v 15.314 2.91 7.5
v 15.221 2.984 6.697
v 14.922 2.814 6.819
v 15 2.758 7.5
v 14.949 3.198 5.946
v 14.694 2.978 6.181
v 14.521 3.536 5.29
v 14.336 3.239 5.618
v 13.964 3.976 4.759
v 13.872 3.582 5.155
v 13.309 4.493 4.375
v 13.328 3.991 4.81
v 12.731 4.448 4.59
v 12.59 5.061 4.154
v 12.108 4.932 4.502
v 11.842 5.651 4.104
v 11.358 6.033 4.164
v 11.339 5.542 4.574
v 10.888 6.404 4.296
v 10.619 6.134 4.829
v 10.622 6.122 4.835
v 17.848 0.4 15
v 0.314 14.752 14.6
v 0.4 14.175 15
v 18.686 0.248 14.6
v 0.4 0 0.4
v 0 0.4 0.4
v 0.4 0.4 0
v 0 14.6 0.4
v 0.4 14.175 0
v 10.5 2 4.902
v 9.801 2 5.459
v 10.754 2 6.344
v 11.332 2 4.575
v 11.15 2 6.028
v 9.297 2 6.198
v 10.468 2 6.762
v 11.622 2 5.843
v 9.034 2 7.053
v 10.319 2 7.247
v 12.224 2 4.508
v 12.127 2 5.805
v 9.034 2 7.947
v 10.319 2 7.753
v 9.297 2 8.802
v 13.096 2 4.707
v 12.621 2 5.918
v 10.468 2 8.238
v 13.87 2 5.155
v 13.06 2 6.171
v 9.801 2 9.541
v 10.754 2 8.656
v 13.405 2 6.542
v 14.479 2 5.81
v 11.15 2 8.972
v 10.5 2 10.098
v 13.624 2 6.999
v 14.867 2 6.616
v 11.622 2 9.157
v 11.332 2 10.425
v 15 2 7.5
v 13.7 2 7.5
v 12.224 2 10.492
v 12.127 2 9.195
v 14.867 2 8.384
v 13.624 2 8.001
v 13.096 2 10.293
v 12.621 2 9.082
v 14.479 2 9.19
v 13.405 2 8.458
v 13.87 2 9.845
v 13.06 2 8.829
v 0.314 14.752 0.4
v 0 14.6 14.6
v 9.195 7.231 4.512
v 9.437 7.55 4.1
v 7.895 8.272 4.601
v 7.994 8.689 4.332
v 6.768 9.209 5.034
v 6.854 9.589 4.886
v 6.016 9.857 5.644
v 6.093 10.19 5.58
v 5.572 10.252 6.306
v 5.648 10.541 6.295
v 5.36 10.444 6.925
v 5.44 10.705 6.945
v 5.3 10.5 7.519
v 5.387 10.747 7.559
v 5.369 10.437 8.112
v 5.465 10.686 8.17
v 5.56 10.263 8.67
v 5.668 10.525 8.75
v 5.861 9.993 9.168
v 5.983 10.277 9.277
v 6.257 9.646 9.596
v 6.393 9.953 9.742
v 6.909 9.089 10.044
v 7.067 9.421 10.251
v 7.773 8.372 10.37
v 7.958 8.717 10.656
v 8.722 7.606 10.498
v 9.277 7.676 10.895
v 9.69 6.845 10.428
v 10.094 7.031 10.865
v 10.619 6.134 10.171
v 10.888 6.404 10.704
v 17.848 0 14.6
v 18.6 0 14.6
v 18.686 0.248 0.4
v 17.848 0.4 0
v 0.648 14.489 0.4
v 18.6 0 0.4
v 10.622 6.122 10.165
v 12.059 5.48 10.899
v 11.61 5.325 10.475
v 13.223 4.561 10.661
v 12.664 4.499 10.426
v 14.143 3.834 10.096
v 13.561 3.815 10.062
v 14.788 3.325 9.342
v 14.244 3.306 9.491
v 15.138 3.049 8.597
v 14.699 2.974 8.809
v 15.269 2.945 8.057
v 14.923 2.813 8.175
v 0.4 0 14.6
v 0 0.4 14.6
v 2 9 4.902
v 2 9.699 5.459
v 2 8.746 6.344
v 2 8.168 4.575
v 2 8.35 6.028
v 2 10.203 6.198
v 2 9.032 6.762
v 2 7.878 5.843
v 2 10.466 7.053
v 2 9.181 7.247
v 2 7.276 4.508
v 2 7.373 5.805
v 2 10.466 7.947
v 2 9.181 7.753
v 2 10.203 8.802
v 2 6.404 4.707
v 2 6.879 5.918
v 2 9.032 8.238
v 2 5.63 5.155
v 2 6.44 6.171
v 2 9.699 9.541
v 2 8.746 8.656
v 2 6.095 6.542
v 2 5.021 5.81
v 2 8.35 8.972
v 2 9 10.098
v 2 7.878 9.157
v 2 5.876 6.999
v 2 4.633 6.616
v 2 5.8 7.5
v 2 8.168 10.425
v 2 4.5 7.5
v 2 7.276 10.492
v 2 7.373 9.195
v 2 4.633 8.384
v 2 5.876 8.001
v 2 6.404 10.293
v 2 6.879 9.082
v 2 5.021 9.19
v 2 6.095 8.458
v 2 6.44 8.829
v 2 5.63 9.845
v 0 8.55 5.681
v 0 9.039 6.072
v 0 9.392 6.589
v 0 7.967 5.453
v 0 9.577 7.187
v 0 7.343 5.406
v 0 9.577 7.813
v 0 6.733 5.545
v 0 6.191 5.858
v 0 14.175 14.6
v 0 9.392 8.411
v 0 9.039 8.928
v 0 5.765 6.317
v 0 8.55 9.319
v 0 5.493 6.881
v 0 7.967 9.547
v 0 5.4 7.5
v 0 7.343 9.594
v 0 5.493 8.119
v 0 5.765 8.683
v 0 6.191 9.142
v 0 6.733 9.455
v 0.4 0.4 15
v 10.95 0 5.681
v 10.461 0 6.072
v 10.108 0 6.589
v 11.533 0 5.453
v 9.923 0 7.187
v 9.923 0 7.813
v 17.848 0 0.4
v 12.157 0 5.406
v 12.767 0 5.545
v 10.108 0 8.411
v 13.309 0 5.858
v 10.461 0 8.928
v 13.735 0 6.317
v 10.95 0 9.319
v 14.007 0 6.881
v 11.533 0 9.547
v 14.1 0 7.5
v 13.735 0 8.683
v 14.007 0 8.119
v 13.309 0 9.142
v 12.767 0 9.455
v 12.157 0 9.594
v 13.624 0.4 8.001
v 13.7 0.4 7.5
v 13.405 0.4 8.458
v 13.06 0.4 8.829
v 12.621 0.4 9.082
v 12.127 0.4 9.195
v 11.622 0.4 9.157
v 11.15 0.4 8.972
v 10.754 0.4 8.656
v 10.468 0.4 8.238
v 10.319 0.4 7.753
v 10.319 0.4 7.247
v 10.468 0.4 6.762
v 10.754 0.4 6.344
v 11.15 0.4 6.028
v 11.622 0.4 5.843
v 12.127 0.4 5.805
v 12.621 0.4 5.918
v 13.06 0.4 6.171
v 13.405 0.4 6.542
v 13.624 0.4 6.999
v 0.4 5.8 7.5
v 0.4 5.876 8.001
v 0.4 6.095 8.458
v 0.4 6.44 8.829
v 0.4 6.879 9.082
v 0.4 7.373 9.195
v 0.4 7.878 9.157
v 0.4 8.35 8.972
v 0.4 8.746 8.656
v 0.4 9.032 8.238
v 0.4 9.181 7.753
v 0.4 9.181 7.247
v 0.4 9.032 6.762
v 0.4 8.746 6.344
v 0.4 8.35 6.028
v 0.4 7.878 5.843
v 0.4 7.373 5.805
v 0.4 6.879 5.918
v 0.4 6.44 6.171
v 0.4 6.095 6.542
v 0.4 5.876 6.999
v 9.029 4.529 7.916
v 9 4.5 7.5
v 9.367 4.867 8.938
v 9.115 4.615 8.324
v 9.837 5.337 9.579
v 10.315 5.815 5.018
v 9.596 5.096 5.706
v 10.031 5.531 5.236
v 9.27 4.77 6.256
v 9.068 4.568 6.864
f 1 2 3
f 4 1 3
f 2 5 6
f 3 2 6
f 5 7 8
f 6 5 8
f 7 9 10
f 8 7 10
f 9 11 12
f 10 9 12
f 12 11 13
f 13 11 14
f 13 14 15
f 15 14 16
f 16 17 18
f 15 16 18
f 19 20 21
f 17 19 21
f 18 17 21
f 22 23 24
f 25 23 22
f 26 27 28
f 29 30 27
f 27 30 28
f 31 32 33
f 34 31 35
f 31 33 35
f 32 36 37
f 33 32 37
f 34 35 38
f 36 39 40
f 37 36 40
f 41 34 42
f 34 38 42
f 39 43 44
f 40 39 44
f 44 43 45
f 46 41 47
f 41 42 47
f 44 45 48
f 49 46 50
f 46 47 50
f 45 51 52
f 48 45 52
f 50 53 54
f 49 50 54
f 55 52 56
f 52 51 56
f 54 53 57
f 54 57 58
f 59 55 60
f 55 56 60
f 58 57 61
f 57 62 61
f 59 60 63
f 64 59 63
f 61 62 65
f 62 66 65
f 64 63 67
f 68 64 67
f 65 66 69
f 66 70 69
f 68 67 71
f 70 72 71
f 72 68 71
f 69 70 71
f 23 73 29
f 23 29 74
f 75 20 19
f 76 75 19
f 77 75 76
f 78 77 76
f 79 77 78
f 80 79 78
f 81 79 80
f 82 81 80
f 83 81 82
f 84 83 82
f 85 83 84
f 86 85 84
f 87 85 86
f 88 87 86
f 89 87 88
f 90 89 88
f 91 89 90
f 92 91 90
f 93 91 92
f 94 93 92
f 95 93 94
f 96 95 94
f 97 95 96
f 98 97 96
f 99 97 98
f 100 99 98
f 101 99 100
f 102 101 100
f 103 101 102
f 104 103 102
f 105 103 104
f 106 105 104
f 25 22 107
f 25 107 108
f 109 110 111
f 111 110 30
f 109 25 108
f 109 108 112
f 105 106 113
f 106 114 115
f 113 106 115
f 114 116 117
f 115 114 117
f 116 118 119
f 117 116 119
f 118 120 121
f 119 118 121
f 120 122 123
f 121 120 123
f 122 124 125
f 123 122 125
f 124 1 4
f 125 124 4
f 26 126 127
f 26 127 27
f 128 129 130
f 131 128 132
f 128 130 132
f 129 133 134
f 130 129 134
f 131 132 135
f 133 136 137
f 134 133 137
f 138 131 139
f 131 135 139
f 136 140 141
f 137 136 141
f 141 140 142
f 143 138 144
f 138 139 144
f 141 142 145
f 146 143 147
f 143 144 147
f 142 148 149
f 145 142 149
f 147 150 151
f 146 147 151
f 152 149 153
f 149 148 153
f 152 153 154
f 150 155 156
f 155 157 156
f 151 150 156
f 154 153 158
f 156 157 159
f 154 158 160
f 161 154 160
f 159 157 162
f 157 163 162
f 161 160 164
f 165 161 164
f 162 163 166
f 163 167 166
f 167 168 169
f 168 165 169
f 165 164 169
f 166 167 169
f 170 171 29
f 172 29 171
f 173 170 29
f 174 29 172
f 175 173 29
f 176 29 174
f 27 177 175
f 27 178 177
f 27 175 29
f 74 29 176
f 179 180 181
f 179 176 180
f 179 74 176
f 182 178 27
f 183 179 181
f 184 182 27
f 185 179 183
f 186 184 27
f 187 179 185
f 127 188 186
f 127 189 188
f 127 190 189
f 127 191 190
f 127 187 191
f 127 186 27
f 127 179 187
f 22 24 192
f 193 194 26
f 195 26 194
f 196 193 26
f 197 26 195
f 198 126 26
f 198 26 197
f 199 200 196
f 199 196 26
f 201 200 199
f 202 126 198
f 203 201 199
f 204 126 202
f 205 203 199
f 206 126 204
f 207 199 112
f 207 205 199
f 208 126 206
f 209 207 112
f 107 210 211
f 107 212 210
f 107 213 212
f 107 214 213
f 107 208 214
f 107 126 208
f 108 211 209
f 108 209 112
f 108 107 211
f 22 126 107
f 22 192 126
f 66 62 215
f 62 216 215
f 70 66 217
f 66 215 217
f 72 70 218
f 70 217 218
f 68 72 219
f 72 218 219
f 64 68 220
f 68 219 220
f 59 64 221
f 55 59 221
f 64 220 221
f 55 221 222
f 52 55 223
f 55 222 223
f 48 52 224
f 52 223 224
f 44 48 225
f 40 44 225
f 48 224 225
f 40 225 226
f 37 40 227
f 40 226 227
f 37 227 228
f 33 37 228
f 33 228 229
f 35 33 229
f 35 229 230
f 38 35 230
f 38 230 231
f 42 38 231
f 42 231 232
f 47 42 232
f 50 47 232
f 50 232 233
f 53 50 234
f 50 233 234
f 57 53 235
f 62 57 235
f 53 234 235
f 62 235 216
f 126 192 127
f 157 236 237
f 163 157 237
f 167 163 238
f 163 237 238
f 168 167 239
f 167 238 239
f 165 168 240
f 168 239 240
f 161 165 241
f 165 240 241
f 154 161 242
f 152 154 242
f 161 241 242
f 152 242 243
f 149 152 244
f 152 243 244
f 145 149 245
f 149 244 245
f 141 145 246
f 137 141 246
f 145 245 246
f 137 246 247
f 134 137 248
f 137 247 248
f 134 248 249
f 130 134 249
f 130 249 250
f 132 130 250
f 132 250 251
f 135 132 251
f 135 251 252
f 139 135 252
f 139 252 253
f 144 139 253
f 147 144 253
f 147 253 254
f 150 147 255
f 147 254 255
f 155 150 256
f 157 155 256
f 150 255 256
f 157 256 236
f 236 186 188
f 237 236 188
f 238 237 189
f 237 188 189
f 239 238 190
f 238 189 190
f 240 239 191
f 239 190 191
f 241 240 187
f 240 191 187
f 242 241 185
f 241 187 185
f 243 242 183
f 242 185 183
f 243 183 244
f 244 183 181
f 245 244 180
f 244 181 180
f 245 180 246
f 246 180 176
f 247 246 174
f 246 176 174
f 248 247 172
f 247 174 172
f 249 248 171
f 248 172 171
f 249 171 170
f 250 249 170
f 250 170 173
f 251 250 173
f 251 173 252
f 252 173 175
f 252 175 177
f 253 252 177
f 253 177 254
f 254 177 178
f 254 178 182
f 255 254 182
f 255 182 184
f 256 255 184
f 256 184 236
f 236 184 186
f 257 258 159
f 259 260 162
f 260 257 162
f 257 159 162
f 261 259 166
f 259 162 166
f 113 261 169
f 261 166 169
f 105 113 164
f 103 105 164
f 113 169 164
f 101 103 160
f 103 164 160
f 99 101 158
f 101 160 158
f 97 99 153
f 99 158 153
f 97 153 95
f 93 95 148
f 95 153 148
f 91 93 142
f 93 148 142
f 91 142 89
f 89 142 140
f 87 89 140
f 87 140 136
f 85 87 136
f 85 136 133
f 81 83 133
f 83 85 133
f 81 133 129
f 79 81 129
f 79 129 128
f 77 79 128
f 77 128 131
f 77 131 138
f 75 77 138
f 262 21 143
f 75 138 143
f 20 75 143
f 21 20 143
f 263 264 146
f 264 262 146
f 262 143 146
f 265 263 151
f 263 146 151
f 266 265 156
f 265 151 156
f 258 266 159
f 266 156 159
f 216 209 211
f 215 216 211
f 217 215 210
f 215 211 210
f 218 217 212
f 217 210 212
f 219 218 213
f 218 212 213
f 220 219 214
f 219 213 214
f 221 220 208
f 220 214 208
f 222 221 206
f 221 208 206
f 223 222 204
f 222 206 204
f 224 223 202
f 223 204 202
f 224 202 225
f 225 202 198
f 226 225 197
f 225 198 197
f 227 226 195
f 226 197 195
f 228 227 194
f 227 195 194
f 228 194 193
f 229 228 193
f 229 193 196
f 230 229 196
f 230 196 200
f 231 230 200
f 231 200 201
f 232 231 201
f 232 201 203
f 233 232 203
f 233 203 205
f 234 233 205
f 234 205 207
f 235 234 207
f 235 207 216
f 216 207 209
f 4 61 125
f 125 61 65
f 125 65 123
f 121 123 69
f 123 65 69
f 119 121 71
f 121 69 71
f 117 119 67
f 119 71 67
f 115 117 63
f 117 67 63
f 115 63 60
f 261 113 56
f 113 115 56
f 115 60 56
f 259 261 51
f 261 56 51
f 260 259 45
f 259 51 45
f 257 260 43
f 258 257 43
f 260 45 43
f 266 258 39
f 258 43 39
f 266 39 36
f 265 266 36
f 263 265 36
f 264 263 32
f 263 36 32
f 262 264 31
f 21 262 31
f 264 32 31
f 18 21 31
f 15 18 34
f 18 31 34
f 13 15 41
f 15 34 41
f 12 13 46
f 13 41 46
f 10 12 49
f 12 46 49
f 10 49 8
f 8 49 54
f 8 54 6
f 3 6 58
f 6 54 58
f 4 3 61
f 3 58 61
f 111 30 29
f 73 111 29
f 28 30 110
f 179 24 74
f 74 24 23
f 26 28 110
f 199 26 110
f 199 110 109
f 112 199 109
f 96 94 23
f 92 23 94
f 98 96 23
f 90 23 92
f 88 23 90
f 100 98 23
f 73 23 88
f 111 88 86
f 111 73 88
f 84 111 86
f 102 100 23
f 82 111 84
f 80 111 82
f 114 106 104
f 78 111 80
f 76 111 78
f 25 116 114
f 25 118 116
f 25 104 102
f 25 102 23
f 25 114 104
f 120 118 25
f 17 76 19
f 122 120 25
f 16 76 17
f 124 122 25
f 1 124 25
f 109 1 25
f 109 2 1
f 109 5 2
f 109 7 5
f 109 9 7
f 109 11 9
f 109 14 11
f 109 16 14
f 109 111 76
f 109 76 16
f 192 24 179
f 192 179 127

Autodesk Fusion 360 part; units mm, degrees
sketch "Sketch1" plane through (0, 0, 0) normal (0, 0, 1) x (1, 0, 0)
  line L0 (0, 0) -> (19, 0)
  line L1 (0, 0) -> (0, 15)
  line L2 (0, 15) -> (19, 0)
  dimension "d1" = 19
  dimension "d2" = 15
extrude "Extrude1" add sketch "Sketch1" along normal blind 15
sketch "cable_holes" plane through (0, 0, 0) normal (0, -1, 0) x (1, 0, 0)
  line L0 (0, 0) -> (19, 0)
  line L1 (19, 0) -> (19, 15)
  line L2 (19, 15) -> (0, 15)
  line L3 (0, 15) -> (0, 0)
  circle A0 centre (4.2, 10.7) radius 1.7
  circle A1 centre (4.2, 4.3) radius 1.7
  circle A2 centre (12, 7.5) radius 1.7
  line L4 (19, 7.5) -> (0, 7.5) construction
  circle A3 centre (4.2, 10.7) radius 3
  circle A4 centre (4.2, 4.3) radius 3
  circle A5 centre (12, 7.5) radius 3
  dimension "d7" = 3.4
  dimension "d8" = 3.4
  dimension "d9" = 3.4
  dimension "d10" = 4.2
  dimension "d11" = 4.2
  dimension "d12" = 6.4
  dimension "d13" = 12
  dimension "d14" = 4.3
  dimension "d20" = 6
  dimension "d21" = 6
  dimension "d22" = 6
extrude "Extrude2" cut sketch "cable_holes" against normal blind 15 contours A2 | A5
extrude "Extrude4" add sketch "cable_holes" against normal blind 2 contours A5
sketch "Sketch3" plane through (0, 0, 0) normal (-1, 0, 0) x (0, -1, 0)
  line L0 (-15, 0) -> (0, 0)
  line L1 (0, 0) -> (0, 15)
  line L2 (0, 15) -> (-15, 15)
  line L3 (-15, 15) -> (-15, 0)
  circle A0 centre (-7.5, 7.5) radius 1.7
  line L4 (-7.5, 15) -> (-7.5, 0) construction
  line L5 (-15, 7.5) -> (0, 7.5) construction
  circle A1 centre (-7.5, 7.5) radius 3
  dimension "d17" = 3.4
  dimension "d25" = 6
extrude "Extrude3" cut sketch "Sketch3" against normal blind 15 contours A0 | A1
extrude "Extrude5" add sketch "Sketch3" against normal blind 2 contours A1
chamfer "Chamfer1" distance 0.4 angle 45 4 edges at (15, 3.1579, 7.5) (5.7, 10.5, 7.5) (0, 9.085, 8.1147) (10.415, 0, 8.1147)
chamfer "Chamfer2" distance 0.4 angle 45 9 edges at (9.5, 7.5, 15) (0, 7.5, 15) (9.5, 0, 15) (19, 0, 7.5) (0, 15, 7.5) (0, 0, 7.5) (0, 7.5, 0) (9.5, 7.5, 0) (9.5, 0, 0)
equation "inner_hole = 3.4 mm"
equation "outer_hole = 6 mm"
equation "d7 = inner_hole"
equation "d8 = inner_hole"
equation "d9 = inner_hole"
equation "d13 = 4.2 mm + 7.8 mm"
equation "d17 = inner_hole"
equation "d20 = outer_hole"
equation "d21 = outer_hole"
equation "d22 = outer_hole"
equation "d25 = outer_hole"
